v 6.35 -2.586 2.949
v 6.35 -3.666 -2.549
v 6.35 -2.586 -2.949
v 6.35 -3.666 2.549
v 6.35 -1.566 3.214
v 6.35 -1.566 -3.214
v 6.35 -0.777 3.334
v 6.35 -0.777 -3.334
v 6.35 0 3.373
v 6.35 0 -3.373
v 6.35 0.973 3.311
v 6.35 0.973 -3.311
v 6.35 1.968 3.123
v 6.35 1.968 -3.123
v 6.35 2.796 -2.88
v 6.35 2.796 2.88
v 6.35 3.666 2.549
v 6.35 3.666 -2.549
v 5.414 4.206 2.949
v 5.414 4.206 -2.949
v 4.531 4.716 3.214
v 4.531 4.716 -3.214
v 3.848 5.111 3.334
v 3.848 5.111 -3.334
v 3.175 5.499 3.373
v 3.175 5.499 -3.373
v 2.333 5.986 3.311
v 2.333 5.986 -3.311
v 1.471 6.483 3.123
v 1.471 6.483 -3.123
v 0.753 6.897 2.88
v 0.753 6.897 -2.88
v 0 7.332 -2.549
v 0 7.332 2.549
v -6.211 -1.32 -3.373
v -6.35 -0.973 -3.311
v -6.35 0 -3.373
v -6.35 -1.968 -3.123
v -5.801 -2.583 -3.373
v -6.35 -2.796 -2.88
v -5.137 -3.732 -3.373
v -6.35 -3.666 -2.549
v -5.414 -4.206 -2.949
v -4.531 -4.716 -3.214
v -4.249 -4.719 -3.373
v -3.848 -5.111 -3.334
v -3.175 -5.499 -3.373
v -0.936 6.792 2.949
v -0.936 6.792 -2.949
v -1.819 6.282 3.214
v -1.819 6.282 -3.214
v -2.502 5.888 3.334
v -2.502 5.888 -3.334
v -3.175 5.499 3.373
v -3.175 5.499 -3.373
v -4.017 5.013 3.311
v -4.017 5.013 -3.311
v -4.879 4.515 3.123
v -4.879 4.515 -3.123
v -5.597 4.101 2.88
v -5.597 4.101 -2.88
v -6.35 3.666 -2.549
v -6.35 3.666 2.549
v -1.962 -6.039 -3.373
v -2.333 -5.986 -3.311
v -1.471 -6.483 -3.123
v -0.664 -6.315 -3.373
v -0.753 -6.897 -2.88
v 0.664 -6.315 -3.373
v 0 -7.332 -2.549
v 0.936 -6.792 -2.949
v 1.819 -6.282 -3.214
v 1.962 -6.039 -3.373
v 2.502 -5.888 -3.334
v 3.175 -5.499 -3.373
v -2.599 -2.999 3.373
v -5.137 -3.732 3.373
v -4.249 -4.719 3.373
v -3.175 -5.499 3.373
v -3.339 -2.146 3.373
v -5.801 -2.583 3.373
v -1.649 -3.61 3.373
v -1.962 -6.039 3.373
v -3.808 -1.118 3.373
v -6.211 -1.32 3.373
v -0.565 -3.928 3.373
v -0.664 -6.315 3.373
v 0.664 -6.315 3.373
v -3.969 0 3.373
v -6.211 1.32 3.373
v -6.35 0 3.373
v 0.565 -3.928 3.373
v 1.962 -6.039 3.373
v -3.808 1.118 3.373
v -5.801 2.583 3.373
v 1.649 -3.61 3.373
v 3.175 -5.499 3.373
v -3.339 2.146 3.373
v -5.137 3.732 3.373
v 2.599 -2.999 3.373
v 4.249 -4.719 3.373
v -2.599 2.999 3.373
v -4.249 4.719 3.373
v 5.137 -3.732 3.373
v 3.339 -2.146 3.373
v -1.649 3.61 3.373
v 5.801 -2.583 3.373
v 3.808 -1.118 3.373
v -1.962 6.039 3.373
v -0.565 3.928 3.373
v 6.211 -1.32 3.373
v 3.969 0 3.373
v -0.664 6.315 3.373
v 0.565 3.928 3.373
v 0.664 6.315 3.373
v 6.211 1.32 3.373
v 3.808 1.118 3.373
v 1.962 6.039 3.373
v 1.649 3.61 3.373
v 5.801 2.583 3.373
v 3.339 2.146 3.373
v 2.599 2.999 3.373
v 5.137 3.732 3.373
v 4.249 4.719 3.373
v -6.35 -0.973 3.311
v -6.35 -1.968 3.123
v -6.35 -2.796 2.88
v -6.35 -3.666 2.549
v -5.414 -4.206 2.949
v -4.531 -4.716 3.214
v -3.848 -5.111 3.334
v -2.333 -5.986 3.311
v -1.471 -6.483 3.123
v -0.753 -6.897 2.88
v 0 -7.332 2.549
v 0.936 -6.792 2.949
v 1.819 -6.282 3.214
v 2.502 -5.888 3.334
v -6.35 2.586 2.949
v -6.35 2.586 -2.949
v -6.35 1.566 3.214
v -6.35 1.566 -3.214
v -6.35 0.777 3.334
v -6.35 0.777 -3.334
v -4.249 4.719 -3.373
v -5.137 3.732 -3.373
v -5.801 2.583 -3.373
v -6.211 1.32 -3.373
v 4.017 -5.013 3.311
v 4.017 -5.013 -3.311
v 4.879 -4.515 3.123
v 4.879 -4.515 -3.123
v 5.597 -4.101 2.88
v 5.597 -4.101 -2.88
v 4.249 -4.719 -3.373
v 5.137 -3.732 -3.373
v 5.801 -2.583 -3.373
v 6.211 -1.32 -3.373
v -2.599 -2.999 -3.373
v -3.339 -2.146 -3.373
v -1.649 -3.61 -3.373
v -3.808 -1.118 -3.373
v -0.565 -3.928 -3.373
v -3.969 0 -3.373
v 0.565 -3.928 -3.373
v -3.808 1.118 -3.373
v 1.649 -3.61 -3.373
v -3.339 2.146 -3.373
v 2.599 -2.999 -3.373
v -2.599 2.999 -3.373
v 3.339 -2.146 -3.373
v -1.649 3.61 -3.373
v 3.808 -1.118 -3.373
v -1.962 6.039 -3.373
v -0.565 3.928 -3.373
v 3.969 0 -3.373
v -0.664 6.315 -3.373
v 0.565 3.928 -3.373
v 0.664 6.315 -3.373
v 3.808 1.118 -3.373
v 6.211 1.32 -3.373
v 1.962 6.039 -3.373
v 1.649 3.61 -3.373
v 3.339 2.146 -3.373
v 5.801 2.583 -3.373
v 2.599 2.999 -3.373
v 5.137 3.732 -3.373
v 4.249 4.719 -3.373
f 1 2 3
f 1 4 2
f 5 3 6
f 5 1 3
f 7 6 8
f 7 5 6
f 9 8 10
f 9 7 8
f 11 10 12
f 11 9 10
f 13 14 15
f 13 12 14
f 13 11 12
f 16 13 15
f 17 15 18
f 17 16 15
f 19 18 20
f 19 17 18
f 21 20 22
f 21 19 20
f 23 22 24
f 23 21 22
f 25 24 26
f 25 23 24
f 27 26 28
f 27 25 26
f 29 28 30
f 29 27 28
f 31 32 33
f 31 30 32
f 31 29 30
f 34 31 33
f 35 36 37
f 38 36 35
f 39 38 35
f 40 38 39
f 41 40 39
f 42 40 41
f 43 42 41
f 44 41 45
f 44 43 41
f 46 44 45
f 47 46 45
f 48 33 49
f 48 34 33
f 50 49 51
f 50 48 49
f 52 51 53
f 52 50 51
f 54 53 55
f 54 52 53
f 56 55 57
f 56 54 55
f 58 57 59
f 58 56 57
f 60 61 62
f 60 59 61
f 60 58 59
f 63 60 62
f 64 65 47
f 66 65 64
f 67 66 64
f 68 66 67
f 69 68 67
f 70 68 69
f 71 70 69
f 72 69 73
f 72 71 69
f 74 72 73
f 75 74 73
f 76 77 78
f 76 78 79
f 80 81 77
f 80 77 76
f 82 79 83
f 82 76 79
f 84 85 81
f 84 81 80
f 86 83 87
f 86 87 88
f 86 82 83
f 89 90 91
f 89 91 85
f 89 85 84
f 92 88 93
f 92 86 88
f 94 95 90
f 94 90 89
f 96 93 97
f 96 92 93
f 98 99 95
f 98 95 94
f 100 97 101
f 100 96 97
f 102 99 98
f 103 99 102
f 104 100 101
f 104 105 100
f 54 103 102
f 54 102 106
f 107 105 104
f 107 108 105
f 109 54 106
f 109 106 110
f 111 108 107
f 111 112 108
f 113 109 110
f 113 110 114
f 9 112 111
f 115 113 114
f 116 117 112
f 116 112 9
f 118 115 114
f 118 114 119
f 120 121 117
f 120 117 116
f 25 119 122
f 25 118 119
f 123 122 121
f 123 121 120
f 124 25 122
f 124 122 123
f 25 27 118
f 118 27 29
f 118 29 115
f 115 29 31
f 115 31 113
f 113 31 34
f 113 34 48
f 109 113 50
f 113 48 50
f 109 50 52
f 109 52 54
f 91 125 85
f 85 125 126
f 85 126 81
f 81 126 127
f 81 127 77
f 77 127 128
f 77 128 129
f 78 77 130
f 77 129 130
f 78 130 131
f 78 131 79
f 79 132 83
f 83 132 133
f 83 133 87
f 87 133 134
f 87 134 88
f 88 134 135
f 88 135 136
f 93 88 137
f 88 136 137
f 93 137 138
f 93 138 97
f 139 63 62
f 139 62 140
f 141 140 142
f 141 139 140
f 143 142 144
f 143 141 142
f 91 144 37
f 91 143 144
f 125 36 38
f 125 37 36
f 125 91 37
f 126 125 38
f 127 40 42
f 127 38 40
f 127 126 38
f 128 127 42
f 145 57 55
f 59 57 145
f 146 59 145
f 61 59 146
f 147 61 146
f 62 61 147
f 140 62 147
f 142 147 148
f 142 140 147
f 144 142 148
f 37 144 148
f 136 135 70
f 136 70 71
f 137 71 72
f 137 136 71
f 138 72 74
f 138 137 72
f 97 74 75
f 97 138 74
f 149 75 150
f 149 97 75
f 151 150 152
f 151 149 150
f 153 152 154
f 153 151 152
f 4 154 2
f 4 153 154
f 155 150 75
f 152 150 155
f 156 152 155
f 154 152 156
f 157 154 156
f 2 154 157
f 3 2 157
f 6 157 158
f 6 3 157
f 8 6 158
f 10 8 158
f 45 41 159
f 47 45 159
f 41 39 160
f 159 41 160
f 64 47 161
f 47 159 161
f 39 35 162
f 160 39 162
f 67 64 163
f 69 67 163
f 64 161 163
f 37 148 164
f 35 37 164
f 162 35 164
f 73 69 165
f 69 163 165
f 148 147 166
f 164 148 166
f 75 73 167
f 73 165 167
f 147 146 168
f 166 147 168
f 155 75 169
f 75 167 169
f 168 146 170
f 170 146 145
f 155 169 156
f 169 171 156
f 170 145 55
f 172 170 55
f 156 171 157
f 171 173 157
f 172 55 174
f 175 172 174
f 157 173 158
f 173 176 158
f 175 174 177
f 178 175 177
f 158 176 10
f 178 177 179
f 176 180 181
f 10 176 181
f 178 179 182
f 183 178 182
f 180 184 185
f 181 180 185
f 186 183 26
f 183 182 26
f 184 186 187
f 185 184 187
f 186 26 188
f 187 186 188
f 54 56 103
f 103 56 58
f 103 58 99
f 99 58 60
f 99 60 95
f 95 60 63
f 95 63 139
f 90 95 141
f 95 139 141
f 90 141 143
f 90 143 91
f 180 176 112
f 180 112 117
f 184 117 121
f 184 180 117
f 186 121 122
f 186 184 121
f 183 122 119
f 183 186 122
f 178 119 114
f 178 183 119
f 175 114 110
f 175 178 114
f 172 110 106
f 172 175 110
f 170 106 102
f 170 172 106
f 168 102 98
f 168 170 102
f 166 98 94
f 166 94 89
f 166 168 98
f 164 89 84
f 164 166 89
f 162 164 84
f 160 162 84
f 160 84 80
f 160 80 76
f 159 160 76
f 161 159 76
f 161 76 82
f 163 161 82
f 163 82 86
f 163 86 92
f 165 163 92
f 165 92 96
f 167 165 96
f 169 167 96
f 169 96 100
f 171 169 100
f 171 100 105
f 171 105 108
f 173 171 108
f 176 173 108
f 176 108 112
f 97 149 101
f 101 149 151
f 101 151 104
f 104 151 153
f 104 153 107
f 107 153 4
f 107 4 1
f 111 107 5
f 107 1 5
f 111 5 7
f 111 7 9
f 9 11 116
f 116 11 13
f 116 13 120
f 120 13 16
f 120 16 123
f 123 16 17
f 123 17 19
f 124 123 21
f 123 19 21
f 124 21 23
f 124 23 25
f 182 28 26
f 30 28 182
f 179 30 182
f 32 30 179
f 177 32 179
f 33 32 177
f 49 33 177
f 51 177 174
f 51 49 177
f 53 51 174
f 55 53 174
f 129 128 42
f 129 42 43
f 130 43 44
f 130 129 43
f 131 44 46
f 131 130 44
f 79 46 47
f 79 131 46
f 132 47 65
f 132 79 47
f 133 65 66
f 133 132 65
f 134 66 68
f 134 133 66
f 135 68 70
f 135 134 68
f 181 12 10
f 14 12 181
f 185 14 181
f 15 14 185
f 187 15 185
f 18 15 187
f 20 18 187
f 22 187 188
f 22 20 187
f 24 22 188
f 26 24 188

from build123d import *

# Parameters (mm, degrees)
EXTRUDE1_DEPTH     = 3.3734375
SKETCH2_R          = 3.96875
CUT_EXTRUDE1_DEPTH = 11.269659873


with BuildPart() as part:
    # Sketch1 → Extrude1 (new body)
    with BuildSketch(Plane.XY):
        Polygon((0, 7.332348419), (-6.35, 3.666174209), (-6.35, -3.666174209), (0, -7.332348419), (6.35, -3.666174209), (6.35, 3.666174209), align=None)
    extrude1 = extrude(amount=EXTRUDE1_DEPTH)

    # Sketch2 → Cut-Extrude1 (cut, through all)
    with BuildSketch(Plane.XY.offset(3.3734375)):
        Circle(SKETCH2_R)
    cut_extrude1 = extrude(amount=-CUT_EXTRUDE1_DEPTH, mode=Mode.SUBTRACT)

    # Sketch3 → Cut-Revolve1 (revolve, cut)
    with BuildSketch(Plane(origin=(0, 0, 0), x_dir=(1, 0, 0), z_dir=(0, 1, 0))):
        Polygon((6.35, -3.3734375), (9.525, -0.709296171), (9.525, -3.3734375), align=None)
    cut_revolve1 = revolve(axis=Axis((0, 0, 0), (0, 0, 1)), mode=Mode.SUBTRACT)

    # Mirror1: Extrude1, Cut-Extrude1, Cut-Revolve1 across plane
    add(extrude1.mirror(Plane(origin=(0, 7.332348419, 0), x_dir=(1, 0, 0), z_dir=(0, 0, 1))))
    add(cut_extrude1.mirror(Plane(origin=(0, 7.332348419, 0), x_dir=(1, 0, 0), z_dir=(0, 0, 1))), mode=Mode.SUBTRACT)
    add(cut_revolve1.mirror(Plane(origin=(0, 7.332348419, 0), x_dir=(1, 0, 0), z_dir=(0, 0, 1))), mode=Mode.SUBTRACT)


solid = part.part
